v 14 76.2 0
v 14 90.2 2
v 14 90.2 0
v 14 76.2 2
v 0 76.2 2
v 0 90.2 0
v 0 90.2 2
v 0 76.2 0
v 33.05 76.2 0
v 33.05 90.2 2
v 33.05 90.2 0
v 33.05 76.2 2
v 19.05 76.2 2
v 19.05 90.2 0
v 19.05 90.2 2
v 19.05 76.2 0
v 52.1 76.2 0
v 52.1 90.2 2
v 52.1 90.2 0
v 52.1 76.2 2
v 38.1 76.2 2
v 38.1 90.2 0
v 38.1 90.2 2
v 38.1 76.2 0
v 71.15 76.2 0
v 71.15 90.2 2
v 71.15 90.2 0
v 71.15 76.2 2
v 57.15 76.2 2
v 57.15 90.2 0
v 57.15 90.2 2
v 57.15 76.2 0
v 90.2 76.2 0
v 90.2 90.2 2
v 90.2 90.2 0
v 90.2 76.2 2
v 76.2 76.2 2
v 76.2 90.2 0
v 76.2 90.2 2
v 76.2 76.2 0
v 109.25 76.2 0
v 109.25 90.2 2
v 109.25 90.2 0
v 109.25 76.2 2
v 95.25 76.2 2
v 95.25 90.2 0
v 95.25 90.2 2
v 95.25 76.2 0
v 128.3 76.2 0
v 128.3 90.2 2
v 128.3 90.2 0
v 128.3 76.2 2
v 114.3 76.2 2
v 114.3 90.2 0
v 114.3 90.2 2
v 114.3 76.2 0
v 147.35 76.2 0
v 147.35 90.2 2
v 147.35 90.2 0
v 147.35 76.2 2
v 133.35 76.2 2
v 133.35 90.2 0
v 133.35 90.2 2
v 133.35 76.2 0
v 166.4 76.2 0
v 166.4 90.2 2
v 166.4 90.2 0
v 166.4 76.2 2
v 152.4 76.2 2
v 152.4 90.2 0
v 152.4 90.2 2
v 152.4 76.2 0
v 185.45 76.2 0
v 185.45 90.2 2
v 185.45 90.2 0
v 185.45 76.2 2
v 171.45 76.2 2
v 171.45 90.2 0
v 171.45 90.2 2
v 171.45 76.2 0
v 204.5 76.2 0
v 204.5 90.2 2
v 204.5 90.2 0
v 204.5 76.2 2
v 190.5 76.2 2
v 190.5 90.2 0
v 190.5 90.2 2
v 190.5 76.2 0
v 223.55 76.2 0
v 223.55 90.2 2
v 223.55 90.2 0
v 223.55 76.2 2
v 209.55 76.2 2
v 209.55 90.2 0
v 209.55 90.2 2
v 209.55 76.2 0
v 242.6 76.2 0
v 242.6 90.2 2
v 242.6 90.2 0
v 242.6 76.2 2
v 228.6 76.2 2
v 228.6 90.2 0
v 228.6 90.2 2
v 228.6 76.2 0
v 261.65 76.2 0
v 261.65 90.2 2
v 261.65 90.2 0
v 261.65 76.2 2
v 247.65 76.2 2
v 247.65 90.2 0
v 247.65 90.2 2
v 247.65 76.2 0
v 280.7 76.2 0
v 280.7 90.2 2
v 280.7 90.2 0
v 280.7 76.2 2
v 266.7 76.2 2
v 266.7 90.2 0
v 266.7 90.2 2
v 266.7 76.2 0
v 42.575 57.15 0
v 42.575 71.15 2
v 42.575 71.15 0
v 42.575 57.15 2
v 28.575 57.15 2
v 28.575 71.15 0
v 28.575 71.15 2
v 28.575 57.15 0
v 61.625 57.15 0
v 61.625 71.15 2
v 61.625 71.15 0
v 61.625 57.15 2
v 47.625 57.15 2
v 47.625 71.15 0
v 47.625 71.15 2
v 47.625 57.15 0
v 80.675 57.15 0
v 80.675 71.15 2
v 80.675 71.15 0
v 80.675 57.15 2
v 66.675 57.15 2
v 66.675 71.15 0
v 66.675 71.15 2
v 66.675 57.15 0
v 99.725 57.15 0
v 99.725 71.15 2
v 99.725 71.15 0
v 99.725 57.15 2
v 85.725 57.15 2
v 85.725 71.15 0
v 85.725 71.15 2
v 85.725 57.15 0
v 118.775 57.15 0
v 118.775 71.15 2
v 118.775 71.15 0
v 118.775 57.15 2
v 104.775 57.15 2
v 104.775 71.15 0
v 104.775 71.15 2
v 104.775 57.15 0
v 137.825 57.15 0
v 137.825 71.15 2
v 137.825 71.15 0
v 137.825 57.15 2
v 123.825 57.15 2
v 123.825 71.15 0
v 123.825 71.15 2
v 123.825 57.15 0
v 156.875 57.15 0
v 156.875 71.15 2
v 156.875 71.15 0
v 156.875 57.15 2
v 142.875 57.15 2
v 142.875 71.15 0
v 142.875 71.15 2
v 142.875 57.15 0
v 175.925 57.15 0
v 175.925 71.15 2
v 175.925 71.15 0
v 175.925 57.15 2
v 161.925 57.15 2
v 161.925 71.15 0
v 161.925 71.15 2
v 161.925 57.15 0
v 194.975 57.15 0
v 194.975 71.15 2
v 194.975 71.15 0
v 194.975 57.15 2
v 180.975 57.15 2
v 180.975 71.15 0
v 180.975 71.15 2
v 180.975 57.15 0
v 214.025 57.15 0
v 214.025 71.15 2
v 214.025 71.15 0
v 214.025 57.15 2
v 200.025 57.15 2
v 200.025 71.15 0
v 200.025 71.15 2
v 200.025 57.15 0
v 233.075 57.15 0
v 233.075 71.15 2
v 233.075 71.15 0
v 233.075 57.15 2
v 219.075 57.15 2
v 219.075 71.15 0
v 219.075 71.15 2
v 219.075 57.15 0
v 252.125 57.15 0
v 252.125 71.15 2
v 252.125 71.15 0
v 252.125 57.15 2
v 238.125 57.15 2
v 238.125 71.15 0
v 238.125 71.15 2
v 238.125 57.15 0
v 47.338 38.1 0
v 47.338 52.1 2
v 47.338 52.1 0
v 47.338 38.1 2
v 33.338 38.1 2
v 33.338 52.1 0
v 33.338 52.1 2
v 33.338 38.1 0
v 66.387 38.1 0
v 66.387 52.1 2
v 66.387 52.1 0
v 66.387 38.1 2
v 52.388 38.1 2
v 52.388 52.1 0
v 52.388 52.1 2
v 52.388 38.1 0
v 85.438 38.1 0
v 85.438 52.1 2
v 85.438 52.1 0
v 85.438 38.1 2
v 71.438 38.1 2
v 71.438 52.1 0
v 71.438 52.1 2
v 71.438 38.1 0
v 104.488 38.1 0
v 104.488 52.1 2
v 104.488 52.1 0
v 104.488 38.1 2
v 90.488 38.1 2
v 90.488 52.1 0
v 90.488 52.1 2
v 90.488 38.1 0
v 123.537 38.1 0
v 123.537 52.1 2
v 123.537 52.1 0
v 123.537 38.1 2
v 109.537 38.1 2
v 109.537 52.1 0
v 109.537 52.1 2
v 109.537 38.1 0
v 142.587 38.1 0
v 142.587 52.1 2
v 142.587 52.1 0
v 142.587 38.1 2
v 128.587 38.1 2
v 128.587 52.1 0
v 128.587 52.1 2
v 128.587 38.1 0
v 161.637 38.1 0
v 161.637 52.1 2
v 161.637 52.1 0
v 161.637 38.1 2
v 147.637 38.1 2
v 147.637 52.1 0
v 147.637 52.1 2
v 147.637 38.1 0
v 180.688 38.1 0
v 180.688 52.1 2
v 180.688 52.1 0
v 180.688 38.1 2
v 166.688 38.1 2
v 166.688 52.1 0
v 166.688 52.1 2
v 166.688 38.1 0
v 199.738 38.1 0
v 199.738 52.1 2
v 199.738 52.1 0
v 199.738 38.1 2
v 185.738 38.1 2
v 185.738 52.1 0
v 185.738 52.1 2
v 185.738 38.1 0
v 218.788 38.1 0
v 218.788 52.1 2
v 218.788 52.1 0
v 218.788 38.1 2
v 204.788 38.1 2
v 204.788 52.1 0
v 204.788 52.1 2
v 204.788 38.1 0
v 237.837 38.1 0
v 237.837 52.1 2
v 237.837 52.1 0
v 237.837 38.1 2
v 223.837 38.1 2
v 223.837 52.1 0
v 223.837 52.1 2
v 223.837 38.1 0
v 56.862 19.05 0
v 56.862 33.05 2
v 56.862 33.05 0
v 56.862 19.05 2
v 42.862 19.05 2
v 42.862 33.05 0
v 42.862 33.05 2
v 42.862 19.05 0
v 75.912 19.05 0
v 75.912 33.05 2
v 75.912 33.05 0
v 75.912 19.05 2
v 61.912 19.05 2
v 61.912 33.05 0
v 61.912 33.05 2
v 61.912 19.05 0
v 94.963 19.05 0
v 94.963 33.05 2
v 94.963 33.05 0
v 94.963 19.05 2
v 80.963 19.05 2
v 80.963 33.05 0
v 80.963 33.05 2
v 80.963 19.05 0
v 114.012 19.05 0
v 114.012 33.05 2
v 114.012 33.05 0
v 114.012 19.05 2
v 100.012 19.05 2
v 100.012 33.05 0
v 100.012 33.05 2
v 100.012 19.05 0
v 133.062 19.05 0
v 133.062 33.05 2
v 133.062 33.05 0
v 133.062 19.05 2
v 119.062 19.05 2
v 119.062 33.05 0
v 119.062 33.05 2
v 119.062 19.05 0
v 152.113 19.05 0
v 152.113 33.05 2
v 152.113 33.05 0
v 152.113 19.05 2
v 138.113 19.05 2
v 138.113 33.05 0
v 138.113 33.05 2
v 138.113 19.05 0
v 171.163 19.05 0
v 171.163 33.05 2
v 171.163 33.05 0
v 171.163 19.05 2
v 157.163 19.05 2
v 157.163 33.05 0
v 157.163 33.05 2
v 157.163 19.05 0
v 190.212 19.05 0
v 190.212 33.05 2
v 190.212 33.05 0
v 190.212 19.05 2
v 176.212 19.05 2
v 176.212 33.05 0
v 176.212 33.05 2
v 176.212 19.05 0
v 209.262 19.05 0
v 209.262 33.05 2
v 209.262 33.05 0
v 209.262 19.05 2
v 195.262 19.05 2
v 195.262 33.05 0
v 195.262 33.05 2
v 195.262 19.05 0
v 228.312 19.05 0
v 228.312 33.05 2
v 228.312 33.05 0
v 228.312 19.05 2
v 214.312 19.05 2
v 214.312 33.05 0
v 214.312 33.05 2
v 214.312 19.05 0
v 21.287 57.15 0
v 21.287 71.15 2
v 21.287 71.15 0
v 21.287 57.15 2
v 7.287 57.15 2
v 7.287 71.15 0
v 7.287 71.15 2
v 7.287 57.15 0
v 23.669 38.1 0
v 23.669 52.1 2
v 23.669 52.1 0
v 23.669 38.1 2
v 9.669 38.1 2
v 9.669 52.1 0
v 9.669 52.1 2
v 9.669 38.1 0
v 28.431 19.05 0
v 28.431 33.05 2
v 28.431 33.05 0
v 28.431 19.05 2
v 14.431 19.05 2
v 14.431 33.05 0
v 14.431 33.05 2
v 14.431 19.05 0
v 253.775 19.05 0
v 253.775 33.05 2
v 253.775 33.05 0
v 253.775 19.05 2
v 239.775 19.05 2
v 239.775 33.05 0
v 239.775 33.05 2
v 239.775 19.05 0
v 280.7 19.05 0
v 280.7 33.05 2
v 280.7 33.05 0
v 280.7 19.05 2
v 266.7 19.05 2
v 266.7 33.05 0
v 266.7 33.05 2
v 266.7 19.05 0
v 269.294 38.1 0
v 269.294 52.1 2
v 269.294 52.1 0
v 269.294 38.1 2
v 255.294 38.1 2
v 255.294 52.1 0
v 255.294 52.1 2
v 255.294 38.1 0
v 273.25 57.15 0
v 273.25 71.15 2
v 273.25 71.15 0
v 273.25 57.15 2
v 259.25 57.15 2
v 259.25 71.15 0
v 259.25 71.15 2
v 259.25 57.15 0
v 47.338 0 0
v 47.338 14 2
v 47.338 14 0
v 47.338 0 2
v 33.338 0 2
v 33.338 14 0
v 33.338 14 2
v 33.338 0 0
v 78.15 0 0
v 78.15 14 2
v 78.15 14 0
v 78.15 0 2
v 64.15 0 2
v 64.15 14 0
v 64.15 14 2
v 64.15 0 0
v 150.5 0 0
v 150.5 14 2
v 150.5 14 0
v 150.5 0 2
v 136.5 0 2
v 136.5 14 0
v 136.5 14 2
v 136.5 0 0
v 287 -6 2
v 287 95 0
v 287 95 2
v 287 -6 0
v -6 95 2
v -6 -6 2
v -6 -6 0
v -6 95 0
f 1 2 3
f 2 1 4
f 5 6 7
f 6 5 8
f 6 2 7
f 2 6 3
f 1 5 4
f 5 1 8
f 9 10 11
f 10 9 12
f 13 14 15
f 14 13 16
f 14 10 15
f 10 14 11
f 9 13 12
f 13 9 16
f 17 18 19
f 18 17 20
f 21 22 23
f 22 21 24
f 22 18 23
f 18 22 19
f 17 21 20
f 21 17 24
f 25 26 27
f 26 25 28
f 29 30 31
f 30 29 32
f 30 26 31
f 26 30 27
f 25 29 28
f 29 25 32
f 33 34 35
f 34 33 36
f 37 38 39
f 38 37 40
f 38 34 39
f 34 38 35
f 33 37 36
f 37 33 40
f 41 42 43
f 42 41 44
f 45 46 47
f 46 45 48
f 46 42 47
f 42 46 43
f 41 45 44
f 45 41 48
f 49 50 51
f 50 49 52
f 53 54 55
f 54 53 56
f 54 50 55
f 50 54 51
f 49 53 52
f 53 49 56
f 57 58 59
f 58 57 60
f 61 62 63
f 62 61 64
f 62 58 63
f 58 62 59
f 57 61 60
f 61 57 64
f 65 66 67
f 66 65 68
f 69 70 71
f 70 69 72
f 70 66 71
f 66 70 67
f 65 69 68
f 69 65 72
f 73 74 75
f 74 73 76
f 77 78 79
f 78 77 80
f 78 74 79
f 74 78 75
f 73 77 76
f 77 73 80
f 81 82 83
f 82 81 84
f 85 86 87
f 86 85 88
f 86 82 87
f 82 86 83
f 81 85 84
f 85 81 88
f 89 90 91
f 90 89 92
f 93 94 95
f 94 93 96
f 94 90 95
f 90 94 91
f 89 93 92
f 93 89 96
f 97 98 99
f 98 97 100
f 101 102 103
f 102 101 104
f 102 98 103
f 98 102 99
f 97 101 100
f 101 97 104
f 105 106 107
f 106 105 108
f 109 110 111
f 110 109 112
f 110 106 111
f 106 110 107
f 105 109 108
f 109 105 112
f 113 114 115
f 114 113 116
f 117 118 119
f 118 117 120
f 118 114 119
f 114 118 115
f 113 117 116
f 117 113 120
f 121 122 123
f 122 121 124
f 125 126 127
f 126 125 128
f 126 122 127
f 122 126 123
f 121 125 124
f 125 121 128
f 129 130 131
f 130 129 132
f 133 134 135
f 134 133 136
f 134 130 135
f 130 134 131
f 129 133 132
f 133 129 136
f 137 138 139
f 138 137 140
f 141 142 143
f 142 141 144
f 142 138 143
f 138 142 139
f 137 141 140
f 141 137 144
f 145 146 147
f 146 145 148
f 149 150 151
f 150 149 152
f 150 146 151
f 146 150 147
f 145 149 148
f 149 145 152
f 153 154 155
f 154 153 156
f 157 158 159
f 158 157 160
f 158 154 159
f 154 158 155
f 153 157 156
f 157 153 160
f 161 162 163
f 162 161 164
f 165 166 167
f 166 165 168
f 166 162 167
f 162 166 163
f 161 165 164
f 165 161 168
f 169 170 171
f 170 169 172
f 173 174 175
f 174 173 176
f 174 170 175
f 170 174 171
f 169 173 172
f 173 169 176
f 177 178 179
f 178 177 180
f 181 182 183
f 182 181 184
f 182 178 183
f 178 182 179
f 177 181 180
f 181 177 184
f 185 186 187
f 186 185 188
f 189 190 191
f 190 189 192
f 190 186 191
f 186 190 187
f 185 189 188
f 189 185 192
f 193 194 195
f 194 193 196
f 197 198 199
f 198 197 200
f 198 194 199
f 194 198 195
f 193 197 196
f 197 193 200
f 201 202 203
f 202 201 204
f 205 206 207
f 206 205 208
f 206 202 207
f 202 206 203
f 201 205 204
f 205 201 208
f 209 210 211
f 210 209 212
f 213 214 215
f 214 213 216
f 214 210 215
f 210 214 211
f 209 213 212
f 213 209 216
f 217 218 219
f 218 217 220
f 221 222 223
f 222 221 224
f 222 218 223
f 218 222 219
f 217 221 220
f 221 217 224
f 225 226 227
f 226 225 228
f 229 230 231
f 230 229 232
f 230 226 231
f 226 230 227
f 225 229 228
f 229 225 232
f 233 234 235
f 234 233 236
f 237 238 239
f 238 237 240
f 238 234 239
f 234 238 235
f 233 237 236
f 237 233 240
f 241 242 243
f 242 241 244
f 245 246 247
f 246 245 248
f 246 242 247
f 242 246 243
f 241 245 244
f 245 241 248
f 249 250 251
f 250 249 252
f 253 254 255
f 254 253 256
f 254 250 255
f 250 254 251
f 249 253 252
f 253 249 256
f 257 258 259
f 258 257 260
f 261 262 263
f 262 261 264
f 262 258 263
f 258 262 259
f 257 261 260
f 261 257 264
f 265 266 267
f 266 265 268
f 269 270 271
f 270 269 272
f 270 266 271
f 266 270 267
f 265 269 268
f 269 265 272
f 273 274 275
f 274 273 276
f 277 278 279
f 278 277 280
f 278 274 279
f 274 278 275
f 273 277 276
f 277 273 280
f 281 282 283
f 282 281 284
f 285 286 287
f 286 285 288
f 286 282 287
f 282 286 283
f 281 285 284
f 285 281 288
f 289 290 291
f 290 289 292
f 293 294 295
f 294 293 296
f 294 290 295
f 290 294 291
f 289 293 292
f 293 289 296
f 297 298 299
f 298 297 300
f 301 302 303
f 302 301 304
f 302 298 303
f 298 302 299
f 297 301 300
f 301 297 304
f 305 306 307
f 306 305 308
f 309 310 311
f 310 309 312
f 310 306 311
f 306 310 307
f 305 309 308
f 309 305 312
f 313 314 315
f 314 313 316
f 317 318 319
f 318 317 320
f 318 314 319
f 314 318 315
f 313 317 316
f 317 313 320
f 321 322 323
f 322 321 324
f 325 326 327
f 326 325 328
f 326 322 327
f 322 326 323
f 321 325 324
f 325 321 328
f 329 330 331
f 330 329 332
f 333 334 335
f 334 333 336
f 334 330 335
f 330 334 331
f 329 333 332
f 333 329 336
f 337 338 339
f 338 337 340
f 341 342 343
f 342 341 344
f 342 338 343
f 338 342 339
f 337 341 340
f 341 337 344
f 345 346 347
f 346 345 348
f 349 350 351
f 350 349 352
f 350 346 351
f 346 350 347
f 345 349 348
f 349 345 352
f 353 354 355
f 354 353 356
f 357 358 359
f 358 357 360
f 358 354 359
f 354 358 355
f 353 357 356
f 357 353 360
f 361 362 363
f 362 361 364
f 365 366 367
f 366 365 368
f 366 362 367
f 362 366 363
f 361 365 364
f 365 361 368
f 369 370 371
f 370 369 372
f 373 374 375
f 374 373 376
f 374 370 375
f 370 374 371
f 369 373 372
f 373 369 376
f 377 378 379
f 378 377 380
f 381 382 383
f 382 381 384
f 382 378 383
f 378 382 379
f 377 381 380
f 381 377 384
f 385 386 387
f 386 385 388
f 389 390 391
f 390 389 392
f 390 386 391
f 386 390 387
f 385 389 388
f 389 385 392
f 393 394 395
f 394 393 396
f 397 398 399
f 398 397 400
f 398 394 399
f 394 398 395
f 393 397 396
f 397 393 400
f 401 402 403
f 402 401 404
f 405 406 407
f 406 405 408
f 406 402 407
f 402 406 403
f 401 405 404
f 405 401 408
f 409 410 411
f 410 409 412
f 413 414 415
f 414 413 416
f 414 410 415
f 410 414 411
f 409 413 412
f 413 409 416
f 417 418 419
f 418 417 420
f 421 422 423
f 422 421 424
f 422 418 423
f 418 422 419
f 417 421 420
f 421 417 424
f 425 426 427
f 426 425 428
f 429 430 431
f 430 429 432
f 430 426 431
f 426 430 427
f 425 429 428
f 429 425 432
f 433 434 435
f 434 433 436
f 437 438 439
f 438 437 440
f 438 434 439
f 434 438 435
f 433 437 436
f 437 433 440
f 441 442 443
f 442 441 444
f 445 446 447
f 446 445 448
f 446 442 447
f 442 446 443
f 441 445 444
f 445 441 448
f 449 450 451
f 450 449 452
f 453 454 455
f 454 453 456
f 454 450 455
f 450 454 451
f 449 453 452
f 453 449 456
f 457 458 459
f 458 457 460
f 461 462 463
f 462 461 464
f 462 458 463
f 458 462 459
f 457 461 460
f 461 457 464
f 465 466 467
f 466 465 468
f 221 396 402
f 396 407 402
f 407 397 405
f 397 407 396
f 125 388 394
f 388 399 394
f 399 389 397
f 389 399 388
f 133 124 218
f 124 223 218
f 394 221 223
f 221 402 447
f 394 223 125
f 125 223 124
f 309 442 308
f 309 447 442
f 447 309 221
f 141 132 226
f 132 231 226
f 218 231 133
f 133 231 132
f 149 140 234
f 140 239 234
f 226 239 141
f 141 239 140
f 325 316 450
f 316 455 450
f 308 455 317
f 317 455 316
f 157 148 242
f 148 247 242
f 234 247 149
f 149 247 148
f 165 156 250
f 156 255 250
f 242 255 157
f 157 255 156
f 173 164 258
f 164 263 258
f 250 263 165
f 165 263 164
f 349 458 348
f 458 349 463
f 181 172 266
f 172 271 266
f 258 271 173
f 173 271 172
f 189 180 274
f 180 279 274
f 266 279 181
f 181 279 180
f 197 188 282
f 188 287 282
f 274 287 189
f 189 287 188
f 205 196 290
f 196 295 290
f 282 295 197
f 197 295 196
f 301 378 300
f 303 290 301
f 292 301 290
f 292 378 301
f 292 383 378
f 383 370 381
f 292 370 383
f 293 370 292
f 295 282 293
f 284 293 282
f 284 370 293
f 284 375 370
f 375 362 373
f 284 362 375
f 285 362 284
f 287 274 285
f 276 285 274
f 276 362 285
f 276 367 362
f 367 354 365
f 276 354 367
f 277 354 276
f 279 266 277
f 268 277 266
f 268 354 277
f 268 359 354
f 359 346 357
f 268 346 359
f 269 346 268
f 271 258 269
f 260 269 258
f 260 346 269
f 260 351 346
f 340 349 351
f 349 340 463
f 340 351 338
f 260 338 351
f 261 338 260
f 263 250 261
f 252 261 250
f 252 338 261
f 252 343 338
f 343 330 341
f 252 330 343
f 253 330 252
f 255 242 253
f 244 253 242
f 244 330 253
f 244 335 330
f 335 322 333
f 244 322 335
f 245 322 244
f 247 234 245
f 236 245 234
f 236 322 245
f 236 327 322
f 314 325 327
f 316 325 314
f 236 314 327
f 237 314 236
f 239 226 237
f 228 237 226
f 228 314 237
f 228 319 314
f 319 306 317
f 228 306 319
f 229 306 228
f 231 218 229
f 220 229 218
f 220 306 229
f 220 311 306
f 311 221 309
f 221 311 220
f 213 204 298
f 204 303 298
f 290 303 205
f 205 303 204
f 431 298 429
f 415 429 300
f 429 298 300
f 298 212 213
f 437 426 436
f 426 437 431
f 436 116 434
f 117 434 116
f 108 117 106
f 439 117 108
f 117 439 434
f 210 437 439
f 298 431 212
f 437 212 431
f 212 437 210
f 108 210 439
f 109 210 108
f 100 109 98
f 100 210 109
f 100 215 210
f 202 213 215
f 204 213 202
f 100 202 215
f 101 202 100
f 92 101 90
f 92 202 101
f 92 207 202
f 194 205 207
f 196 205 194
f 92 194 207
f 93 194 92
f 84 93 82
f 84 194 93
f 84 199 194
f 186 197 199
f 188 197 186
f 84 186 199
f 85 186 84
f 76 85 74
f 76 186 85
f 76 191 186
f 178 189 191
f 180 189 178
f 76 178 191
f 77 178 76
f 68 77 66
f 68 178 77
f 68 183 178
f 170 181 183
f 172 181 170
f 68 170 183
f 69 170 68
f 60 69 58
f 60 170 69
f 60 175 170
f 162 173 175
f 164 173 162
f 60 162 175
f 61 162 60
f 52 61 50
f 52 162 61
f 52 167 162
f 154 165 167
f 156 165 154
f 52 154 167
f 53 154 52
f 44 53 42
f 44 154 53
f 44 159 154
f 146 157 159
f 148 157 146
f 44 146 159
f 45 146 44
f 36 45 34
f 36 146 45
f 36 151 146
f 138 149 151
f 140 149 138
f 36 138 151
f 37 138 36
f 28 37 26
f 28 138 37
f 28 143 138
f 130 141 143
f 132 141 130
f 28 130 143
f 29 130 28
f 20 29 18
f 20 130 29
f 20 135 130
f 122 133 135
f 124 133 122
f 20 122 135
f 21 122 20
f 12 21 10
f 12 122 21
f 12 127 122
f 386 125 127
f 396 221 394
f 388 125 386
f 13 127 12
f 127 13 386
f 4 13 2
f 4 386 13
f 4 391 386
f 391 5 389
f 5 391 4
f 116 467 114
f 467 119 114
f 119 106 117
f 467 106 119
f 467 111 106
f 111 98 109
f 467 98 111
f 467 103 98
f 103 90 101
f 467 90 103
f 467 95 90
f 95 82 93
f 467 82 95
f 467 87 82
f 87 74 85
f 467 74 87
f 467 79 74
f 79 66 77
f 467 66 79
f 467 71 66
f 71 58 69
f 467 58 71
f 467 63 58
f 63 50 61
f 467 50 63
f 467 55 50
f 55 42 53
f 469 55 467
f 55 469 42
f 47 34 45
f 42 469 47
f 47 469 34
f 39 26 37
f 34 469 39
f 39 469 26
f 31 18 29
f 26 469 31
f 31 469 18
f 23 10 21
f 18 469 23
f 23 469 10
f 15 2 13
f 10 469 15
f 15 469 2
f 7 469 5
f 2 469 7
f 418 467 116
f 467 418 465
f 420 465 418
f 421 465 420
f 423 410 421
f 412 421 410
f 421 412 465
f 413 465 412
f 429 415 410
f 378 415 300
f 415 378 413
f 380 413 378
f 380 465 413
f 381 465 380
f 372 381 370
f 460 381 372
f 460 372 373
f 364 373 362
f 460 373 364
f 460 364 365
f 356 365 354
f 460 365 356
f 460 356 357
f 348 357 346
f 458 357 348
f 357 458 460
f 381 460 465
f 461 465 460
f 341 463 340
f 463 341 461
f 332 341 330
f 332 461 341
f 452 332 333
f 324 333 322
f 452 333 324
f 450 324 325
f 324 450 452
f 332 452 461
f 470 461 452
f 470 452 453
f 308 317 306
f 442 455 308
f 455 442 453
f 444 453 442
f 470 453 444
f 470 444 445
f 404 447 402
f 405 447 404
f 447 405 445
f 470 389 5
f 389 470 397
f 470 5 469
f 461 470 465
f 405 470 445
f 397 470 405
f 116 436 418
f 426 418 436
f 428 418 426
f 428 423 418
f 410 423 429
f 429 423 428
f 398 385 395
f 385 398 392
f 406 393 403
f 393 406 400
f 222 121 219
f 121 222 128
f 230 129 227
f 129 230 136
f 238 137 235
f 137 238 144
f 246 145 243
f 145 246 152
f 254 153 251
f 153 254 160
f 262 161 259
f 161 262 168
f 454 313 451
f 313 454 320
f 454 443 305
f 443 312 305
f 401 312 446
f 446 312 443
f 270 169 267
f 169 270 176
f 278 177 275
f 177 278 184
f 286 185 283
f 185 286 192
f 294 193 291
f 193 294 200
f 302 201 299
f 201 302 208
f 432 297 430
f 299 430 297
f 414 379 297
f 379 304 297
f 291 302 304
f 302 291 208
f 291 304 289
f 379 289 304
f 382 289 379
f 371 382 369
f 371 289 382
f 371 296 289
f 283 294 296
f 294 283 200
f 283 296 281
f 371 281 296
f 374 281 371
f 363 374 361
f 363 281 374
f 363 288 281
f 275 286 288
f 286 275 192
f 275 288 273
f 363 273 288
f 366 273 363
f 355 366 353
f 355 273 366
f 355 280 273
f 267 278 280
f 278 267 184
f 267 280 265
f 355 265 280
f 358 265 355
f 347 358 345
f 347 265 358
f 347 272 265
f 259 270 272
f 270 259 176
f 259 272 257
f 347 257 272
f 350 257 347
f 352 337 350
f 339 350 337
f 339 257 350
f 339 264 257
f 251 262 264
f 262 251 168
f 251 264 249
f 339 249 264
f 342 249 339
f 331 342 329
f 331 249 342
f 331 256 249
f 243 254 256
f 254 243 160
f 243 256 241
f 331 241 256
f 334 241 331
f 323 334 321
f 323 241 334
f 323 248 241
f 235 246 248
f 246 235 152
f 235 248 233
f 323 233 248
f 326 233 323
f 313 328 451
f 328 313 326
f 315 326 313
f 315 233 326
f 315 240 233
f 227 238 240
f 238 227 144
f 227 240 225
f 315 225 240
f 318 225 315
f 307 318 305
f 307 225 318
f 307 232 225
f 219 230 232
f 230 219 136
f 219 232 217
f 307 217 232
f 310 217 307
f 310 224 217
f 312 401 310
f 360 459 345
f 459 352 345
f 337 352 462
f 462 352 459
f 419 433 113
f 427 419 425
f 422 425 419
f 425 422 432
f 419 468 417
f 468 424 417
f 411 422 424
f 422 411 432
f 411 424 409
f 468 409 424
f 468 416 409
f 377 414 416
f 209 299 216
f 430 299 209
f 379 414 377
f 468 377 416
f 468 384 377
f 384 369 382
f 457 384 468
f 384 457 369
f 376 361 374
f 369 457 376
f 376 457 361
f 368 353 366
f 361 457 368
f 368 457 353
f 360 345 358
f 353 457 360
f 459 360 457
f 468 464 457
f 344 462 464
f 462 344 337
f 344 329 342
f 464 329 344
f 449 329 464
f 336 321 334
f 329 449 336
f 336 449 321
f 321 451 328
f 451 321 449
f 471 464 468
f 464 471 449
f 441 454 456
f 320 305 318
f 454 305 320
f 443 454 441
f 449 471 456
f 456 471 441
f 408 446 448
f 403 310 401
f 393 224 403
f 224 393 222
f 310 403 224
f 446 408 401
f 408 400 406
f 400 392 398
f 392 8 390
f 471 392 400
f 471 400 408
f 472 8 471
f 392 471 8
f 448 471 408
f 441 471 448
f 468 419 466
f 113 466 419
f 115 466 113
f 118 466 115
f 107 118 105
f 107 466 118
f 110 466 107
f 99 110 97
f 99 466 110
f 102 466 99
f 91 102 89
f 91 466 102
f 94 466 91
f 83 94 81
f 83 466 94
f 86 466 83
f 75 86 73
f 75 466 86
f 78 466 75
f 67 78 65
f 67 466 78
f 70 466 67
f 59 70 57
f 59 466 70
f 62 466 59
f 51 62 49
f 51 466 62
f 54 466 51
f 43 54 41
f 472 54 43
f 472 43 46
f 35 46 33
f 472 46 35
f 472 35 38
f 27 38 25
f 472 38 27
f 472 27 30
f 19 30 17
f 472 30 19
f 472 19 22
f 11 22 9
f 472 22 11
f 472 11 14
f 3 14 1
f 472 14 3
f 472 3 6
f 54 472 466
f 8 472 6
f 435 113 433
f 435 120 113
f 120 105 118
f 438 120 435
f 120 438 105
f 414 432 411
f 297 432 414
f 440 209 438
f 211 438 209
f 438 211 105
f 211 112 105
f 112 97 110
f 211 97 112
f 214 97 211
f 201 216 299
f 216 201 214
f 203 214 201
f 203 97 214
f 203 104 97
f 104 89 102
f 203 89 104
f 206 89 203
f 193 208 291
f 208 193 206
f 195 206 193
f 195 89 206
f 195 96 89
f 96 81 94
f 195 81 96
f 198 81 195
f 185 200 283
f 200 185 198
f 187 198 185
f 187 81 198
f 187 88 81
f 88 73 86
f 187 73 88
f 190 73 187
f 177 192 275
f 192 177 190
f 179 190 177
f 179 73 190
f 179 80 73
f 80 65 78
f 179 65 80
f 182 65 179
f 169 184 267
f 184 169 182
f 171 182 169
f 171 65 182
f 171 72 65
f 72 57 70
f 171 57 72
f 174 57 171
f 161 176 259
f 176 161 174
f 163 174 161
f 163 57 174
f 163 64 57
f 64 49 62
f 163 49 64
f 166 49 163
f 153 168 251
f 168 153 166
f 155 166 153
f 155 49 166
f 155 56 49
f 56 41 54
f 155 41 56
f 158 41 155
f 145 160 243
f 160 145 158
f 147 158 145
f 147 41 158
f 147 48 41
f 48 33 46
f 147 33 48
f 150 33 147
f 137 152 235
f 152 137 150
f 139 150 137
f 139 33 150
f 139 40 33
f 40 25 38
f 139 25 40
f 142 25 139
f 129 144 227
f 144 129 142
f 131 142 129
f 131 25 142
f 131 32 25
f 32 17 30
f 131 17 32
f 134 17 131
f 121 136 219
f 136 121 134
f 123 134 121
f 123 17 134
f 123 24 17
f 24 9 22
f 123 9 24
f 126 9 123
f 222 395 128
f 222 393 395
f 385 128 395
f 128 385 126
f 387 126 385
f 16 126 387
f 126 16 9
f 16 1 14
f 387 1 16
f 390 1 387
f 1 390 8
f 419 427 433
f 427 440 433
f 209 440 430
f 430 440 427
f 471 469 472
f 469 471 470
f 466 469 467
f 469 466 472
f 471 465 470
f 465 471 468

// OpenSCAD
module hole(){  //switch hole is 14 mm, 
    cube(14);
}

module alphas(){
    for (x_position = [0:19.05:267]) {              //The size of 1U keycap is
        translate([x_position, 76.2, -7]) hole();   //around 19mm, Matt3o
    }                                               //reccomends 19.05mm gaps
    for (x_position = [0:19.05:210]) {
        translate([x_position+1.5*19.05, 57.15, -7]) hole();
    }
    for (x_position = [0:19.05:191]) {
        translate([x_position+1.75*19.05, 38.1, -7]) hole();
    }
    for (x_position = [0:19.05:172]) {
        translate([x_position+2.25*19.05, 19.05, -7]) hole();
    }
}

module mods(){  //not sure if any of those is correct
    //Tab       //will have to remake this, the math is insane and probably wrong
    translate([(19.05*1.5)/2-7,57.15,-7]) hole();   //probably correct
    //Caps
    translate([(19.05*1.75)/2-7,38.1,-7]) hole();   //probably correct
    //Lshift
    translate([(19.05*2.25)/2-7,19.05,-7]) hole();  //might be correct
    //Rshift
    translate([247.65-(1.75/2)-7, 19.05, -7]) hole(); //no idea
    //Fn
    translate([266.7, 19.05, -7]) hole();           //probably correct
    //Return
    translate([(2.25*19.05)+191+(2.25*19.05/2), 38.1, -7]) hole(); //probably wrong
    //Pipe
    translate([267-(1.5/2)-7, 57.15, -7]) hole();   //probably wrong
    
    //LAlt
    translate([(19.05*1.75), 0, -7]) hole();        //probably good
    //LOption
    translate([(19.05*3+7), 0, -7]) hole();
    
    
    //spacebar
    translate([287/2-7, 0, -7]) hole(); //idk tbh
    

    
    //todo 2 keys left of spacebar and 2 keys right of spacebar
}

//testing some things, I'll have to make this into two pieces to be able
//to print this on my printer with 23cm*23cm printbed

difference(){
    translate([-6,-6,0])cube([293,101,2]);
    alphas();
    mods();
}
